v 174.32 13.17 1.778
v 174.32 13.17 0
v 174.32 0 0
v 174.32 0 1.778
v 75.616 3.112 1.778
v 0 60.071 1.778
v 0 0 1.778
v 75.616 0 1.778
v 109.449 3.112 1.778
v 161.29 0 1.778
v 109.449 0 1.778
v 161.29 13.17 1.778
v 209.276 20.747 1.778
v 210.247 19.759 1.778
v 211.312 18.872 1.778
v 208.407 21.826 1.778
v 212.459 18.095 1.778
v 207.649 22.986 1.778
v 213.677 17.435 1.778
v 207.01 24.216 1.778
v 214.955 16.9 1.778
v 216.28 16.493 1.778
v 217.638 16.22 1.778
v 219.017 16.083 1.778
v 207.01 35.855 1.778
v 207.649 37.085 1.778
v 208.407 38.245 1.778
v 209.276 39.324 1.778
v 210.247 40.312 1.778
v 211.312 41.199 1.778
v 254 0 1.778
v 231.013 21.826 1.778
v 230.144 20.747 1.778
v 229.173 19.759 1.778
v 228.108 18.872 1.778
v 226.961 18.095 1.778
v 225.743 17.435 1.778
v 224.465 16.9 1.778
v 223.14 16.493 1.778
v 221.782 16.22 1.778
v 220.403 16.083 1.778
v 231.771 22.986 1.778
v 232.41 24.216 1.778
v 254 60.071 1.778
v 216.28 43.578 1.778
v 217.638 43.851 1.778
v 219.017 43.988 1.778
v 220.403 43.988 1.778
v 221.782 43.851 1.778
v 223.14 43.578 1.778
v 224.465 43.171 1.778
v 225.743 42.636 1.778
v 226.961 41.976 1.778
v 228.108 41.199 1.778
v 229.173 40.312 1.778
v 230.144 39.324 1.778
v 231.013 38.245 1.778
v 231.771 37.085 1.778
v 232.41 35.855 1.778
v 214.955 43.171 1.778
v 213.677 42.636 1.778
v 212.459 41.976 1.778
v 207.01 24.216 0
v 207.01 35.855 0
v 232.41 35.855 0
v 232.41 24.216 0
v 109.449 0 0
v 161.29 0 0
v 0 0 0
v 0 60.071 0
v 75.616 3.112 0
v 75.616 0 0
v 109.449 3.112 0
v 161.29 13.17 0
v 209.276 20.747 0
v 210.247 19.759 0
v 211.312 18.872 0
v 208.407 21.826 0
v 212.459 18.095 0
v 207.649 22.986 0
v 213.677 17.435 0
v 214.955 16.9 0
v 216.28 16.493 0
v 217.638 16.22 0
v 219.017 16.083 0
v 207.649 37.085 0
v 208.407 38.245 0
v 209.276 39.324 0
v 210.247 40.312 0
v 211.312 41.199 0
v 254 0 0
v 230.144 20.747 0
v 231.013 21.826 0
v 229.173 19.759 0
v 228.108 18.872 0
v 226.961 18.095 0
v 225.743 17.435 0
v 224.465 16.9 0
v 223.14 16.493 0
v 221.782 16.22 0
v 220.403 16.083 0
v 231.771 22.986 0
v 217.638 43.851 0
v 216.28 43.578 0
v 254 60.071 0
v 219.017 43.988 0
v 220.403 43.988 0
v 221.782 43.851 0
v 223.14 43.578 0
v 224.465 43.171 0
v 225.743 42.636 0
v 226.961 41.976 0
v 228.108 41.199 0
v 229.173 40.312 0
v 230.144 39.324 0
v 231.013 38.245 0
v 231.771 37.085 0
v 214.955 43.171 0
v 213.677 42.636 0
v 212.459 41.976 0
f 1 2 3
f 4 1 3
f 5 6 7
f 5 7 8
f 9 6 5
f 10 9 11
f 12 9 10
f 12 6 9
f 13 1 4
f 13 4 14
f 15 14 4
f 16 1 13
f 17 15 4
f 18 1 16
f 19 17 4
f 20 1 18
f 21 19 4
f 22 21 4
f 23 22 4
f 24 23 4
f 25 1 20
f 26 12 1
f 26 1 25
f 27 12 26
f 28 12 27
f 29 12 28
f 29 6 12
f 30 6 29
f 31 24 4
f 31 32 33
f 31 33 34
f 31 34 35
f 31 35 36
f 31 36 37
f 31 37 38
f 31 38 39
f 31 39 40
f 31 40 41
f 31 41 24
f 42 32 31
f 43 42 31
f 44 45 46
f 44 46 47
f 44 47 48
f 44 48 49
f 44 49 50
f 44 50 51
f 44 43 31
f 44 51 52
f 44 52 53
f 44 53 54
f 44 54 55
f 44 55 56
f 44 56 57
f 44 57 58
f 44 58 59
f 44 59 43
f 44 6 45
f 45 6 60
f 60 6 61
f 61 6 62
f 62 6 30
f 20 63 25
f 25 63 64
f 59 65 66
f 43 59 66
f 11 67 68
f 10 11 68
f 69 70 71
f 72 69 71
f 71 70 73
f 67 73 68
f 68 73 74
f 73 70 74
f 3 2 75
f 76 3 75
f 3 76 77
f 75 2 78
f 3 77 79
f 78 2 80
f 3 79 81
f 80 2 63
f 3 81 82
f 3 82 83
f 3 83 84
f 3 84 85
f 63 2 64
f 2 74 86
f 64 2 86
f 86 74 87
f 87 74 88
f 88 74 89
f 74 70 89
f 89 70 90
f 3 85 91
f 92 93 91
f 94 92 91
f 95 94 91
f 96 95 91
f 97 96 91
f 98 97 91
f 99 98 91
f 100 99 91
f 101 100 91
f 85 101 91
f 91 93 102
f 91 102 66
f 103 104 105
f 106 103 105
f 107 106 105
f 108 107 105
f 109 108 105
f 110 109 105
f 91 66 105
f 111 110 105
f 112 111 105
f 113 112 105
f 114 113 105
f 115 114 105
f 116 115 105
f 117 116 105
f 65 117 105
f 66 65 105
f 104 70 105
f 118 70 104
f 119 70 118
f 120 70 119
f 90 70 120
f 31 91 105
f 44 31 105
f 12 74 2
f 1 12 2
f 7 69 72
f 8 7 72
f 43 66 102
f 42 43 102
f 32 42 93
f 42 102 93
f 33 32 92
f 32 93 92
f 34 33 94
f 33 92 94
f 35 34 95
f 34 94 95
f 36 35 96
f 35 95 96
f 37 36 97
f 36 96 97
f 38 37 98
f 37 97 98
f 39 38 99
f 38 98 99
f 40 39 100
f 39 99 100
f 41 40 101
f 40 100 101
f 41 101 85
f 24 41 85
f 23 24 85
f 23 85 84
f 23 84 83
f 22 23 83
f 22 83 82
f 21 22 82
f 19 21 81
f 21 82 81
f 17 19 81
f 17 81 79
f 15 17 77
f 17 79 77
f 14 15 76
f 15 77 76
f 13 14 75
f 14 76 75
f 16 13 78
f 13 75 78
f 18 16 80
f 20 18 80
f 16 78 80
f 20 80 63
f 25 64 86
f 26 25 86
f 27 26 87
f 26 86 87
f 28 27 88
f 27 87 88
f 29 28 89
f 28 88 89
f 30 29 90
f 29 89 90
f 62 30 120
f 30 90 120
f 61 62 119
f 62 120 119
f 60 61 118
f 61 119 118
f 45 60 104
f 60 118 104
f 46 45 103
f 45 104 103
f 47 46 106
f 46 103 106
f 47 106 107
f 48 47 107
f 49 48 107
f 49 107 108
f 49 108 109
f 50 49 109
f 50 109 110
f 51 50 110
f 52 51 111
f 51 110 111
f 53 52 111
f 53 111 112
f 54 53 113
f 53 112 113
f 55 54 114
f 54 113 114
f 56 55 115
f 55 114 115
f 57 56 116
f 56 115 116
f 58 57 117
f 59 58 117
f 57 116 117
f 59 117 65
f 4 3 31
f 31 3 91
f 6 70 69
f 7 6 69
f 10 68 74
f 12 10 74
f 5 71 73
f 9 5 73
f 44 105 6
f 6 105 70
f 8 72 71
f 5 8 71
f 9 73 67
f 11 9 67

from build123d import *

# Parameters (mm, degrees)
BOSS_EXTRUDE2_DEPTH = 1.778


with BuildPart() as part:
    # Sketch1 → Boss-Extrude2 (new body)
    with BuildSketch(Plane.XY):
        Polygon((109.4486, 0), (161.29, 0), (161.29, 13.1699), (174.3202, 13.1699), (174.3202, 0), (254, 0), (254, 60.071), (0, 60.071), (0, 0), (75.6158, 0), (75.6158, 3.1115), (109.4486, 3.1115), align=None)
        with BuildLine():
            Line((232.41, 35.855371133), (232.41, 24.215628867))
            ThreePointArc((232.41, 24.215628867), (219.71, 16.0655), (207.01, 24.215628867))
            Line((207.01, 24.215628867), (207.01, 35.855371133))
            ThreePointArc((207.01, 35.855371133), (219.71, 44.0055), (232.41, 35.855371133))
        make_face(mode=Mode.SUBTRACT)
    extrude(amount=BOSS_EXTRUDE2_DEPTH)


solid = part.part
